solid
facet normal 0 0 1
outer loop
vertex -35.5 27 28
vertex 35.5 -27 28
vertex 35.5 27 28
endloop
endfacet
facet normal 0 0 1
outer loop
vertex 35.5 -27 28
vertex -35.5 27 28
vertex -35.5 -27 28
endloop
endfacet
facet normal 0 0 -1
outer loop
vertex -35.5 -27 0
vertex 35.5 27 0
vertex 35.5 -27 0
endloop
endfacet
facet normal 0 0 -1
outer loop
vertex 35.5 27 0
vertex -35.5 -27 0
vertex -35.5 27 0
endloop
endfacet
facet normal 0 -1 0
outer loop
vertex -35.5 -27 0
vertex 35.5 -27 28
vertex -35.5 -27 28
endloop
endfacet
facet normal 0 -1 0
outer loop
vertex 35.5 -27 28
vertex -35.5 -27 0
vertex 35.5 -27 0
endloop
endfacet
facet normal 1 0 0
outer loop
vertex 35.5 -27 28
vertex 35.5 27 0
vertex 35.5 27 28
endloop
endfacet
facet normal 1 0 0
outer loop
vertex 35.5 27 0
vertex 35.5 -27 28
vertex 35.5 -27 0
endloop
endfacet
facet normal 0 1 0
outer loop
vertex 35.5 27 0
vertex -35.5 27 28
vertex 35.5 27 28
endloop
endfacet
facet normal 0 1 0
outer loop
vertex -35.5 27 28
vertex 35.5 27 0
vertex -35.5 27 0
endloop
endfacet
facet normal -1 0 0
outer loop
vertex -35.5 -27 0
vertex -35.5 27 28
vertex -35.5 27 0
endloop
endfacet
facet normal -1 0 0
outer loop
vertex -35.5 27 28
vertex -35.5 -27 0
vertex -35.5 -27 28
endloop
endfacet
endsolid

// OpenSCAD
// This is a comment

// Same as mirror() but duplicates the children as opposed to just move it.
module mirrored(v) {
	children();
	mirror(v = v) {
	  children();
	} 
}



module non_working_sample() {
	// Import the sample, recenter it and then rotate it to be in the way it is
	// going to be printed.
	rotate([-90,180, 90])
  translate([0,0,36.35])
	import("Montana600Dummy.stl");
}

module source_block(length, width, height) {
	translate([0, 0 , height/2])
  cube([length, width, height], center = true);
}


height = 28;
length = 71;
width = 54;

source_block(length, width, height);


//#non_working_sample();
